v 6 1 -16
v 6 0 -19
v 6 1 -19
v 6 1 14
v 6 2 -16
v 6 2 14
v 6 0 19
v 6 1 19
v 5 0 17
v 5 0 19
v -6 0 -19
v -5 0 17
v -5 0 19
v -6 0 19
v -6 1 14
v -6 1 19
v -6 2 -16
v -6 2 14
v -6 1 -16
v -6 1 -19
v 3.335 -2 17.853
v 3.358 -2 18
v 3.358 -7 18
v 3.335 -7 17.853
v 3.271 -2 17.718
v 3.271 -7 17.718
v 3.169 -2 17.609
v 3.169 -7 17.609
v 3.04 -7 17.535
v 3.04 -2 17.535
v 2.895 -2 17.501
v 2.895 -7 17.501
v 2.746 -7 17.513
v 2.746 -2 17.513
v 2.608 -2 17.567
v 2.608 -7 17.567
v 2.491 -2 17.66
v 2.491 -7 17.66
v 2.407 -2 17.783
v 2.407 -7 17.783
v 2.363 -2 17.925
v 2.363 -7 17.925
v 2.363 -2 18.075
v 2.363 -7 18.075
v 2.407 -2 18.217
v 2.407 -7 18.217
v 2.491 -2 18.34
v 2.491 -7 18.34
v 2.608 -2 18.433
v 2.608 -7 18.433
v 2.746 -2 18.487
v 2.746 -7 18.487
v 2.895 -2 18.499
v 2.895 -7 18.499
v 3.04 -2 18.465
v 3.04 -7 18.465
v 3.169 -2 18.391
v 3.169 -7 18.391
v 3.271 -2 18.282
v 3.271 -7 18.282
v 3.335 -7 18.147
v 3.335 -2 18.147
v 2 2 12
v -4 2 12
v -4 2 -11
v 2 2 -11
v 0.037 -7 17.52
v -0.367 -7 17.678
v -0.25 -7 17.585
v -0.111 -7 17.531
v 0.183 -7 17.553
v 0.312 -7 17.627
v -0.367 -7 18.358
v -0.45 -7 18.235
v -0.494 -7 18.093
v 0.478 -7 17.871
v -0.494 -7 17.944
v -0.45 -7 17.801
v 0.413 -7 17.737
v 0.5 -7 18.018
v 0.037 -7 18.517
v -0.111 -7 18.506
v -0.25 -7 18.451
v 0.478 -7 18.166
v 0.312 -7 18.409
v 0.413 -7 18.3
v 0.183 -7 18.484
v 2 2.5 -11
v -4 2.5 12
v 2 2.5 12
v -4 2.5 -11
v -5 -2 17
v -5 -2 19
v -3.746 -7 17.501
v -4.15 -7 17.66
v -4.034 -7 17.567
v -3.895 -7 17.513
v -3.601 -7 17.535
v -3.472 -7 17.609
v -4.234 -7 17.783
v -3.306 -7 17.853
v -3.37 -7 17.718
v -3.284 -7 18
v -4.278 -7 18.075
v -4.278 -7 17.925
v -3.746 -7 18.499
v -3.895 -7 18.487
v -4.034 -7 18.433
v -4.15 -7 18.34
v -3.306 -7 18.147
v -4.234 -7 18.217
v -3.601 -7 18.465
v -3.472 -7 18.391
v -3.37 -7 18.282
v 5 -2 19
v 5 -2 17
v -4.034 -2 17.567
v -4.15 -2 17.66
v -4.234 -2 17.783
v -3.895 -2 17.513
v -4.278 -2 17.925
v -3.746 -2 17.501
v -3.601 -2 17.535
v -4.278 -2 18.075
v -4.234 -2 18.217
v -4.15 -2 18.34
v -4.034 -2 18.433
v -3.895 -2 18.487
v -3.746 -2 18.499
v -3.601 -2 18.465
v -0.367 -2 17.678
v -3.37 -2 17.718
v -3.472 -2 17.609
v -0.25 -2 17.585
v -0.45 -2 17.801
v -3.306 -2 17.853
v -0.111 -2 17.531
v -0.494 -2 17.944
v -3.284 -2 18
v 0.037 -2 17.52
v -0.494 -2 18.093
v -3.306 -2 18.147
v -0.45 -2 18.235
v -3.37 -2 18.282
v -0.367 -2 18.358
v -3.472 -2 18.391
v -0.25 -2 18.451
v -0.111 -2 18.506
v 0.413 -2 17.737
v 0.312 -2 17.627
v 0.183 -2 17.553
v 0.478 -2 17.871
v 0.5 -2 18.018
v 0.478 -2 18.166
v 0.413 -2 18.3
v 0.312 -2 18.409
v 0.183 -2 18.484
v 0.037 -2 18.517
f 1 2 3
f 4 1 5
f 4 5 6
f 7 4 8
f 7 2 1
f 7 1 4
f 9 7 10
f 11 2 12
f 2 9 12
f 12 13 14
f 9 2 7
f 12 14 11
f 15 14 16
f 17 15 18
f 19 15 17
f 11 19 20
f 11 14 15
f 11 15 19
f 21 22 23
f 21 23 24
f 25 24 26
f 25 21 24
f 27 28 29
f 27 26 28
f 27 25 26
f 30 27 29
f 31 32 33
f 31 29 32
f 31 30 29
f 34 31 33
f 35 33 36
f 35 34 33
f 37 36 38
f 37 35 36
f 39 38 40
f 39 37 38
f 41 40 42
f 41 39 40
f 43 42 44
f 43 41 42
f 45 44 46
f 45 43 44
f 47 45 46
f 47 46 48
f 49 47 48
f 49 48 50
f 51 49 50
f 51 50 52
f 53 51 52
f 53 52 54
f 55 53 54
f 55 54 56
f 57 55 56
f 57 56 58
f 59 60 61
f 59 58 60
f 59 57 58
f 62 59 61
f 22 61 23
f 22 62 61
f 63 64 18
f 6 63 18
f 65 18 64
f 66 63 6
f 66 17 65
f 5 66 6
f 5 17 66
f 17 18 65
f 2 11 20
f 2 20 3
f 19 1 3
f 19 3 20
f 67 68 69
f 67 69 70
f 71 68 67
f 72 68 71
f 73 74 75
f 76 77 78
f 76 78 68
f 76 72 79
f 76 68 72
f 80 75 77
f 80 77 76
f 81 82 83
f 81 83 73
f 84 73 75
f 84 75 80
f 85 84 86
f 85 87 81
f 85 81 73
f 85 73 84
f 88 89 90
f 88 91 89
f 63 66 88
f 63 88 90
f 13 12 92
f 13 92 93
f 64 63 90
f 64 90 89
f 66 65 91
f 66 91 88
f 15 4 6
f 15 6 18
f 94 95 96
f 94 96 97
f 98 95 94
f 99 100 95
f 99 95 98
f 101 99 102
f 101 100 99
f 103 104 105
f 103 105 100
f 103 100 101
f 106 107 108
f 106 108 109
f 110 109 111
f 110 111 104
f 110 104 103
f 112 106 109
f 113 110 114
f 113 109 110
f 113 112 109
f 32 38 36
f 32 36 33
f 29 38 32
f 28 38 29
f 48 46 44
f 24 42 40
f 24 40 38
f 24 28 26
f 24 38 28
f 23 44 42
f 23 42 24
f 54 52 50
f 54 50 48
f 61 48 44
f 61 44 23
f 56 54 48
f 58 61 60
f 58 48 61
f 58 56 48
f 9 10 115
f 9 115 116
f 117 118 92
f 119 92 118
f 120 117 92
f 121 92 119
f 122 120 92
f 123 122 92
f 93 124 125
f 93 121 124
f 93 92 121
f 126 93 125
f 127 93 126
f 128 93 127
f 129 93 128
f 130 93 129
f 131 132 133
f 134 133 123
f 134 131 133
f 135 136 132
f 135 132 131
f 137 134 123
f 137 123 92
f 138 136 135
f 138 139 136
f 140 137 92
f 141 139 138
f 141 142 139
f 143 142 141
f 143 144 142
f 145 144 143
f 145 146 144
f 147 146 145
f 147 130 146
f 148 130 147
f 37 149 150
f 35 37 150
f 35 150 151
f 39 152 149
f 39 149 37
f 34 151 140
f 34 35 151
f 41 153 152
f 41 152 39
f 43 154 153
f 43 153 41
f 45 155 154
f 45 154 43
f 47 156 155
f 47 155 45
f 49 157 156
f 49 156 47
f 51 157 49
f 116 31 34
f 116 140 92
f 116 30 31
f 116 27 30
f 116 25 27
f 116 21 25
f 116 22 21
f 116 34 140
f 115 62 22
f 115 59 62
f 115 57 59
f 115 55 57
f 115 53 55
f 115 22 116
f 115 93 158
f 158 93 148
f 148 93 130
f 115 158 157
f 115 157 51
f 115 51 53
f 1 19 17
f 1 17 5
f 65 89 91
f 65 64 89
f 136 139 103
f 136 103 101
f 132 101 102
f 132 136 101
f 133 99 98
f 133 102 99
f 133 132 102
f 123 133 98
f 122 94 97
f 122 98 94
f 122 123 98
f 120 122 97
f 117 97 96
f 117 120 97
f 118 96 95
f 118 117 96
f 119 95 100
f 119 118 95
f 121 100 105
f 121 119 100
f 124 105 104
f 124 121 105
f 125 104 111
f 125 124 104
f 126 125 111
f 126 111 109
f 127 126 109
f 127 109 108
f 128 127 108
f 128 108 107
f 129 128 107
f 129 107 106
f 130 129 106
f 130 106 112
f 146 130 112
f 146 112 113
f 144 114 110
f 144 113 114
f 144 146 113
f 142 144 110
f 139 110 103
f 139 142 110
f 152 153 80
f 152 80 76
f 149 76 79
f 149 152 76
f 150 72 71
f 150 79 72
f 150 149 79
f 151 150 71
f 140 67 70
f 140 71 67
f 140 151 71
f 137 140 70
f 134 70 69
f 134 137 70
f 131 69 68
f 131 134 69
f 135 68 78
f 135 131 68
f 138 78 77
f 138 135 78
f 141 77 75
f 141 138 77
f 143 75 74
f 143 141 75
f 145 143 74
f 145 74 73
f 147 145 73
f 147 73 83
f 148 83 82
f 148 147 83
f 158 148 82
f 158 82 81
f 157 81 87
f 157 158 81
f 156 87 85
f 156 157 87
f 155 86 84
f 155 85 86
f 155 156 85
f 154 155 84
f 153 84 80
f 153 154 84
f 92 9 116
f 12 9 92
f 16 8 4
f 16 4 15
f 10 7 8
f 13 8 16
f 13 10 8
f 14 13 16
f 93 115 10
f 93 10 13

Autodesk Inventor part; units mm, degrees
ref_plane "YZ Plane" through (0, 0, 0) normal (1, 0, 0) x (0, 1, 0)
ref_plane "XZ Plane" through (0, 0, 0) normal (0, 1, 0) x (-1, 0, 0)
ref_plane "XY Plane" through (0, 0, 0) normal (0, 0, 1) x (1, 0, 0)
sketch "Sketch1" plane through (0, 0, 0) normal (0, 1, 0) x (-1, 0, 0)
  line L0 (6, 19) -> (6, -19)
  line L1 (6, -19) -> (-6, -19)
  line L2 (-6, -19) -> (-6, 19)
  line L3 (-6, 19) -> (6, 19)
  line L4 (6, 19) -> (-6, -19) construction
  line L5 (6, -19) -> (-6, 19) construction
  point P0 (0, 0)
  dimension "d0" = 38
  dimension "d1" = 12
extrude "Extrusion1" add sketch "Sketch1" along normal blind 1
sketch "Sketch2" plane through (0, 1, 0) normal (0, 1, 0) x (1, 0, 0)
  point P0 (0, 0)
sketch "Sketch3" plane through (0, 1, 0) normal (0, 1, 0) x (1, 0, 0)
  line L0 (-6, -14) -> (-6, 16)
  line L1 (-6, 16) -> (6, 16)
  line L2 (6, 16) -> (6, -14)
  line L3 (6, -14) -> (-6, -14)
  line L4 (-6, -14) -> (6, 16) construction
  line L5 (-6, 16) -> (6, -14) construction
  line L6 (-6, -19) -> (6, -19) projected
  line L7 (-6, 19) -> (-6, -19) projected
  line L8 (-6, 16) -> (-6, 19)
  dimension "d4" = 30
  dimension "d5" = 12
extrude "Extrusion2" add sketch "Sketch3" along normal blind 1
sketch "Sketch4" plane through (0, 2, 0) normal (0, 1, 0) x (1, 0, 0)
  point P0 (0, 0)
sketch "Sketch5" plane through (0, 2, 0) normal (0, 1, 0) x (1, 0, 0)
  point P0 (0, 0)
sketch "Sketch6" plane through (0, 0, 0) normal (0, -1, 0) x (1, 0, 0)
  line L0 (-6, 19) -> (6, 19) projected
  line L1 (0, 19) -> (5, 19)
  line L2 (-5, 17) -> (-5, 19)
  line L3 (-5, 19) -> (5, 19)
  line L4 (5, 19) -> (5, 17)
  line L5 (5, 17) -> (-5, 17)
  point P0 (0, 0)
  dimension "d11" = 5
  dimension "d12" = 2
  dimension "d13" = 5
extrude "Extrusion3" add sketch "Sketch6" along normal blind 2
sketch "Sketch7" plane through (0, -2, 0) normal (0, -1, 0) x (1, 0, 0)
  circle A0 centre (0, 18.0182) radius 0.5
  circle A1 centre (-3.7835, 18) radius 0.5
  circle A2 centre (2.8577, 18) radius 0.5
  point P0 (0, 0)
  dimension "d16" = 1
  dimension "d17" = 1
  dimension "d18" = 1
extrude "Extrusion4" add sketch "Sketch7" along normal blind 5
sketch "Sketch8" plane through (0, 2, 0) normal (0, 1, 0) x (1, 0, 0)
  line L0 (-6, -14) -> (6, -14) projected
  line L1 (-4, -12) -> (-4, 11)
  line L2 (-4, 11) -> (2, 11)
  line L3 (2, 11) -> (2, -12)
  line L4 (2, -12) -> (-4, -12)
  point P0 (0, 0)
  dimension "d31" = 23
  dimension "d32" = 6
extrude "Extrusion5" add sketch "Sketch8" along normal blind 0.5
properties part number "OLED_128x32"
